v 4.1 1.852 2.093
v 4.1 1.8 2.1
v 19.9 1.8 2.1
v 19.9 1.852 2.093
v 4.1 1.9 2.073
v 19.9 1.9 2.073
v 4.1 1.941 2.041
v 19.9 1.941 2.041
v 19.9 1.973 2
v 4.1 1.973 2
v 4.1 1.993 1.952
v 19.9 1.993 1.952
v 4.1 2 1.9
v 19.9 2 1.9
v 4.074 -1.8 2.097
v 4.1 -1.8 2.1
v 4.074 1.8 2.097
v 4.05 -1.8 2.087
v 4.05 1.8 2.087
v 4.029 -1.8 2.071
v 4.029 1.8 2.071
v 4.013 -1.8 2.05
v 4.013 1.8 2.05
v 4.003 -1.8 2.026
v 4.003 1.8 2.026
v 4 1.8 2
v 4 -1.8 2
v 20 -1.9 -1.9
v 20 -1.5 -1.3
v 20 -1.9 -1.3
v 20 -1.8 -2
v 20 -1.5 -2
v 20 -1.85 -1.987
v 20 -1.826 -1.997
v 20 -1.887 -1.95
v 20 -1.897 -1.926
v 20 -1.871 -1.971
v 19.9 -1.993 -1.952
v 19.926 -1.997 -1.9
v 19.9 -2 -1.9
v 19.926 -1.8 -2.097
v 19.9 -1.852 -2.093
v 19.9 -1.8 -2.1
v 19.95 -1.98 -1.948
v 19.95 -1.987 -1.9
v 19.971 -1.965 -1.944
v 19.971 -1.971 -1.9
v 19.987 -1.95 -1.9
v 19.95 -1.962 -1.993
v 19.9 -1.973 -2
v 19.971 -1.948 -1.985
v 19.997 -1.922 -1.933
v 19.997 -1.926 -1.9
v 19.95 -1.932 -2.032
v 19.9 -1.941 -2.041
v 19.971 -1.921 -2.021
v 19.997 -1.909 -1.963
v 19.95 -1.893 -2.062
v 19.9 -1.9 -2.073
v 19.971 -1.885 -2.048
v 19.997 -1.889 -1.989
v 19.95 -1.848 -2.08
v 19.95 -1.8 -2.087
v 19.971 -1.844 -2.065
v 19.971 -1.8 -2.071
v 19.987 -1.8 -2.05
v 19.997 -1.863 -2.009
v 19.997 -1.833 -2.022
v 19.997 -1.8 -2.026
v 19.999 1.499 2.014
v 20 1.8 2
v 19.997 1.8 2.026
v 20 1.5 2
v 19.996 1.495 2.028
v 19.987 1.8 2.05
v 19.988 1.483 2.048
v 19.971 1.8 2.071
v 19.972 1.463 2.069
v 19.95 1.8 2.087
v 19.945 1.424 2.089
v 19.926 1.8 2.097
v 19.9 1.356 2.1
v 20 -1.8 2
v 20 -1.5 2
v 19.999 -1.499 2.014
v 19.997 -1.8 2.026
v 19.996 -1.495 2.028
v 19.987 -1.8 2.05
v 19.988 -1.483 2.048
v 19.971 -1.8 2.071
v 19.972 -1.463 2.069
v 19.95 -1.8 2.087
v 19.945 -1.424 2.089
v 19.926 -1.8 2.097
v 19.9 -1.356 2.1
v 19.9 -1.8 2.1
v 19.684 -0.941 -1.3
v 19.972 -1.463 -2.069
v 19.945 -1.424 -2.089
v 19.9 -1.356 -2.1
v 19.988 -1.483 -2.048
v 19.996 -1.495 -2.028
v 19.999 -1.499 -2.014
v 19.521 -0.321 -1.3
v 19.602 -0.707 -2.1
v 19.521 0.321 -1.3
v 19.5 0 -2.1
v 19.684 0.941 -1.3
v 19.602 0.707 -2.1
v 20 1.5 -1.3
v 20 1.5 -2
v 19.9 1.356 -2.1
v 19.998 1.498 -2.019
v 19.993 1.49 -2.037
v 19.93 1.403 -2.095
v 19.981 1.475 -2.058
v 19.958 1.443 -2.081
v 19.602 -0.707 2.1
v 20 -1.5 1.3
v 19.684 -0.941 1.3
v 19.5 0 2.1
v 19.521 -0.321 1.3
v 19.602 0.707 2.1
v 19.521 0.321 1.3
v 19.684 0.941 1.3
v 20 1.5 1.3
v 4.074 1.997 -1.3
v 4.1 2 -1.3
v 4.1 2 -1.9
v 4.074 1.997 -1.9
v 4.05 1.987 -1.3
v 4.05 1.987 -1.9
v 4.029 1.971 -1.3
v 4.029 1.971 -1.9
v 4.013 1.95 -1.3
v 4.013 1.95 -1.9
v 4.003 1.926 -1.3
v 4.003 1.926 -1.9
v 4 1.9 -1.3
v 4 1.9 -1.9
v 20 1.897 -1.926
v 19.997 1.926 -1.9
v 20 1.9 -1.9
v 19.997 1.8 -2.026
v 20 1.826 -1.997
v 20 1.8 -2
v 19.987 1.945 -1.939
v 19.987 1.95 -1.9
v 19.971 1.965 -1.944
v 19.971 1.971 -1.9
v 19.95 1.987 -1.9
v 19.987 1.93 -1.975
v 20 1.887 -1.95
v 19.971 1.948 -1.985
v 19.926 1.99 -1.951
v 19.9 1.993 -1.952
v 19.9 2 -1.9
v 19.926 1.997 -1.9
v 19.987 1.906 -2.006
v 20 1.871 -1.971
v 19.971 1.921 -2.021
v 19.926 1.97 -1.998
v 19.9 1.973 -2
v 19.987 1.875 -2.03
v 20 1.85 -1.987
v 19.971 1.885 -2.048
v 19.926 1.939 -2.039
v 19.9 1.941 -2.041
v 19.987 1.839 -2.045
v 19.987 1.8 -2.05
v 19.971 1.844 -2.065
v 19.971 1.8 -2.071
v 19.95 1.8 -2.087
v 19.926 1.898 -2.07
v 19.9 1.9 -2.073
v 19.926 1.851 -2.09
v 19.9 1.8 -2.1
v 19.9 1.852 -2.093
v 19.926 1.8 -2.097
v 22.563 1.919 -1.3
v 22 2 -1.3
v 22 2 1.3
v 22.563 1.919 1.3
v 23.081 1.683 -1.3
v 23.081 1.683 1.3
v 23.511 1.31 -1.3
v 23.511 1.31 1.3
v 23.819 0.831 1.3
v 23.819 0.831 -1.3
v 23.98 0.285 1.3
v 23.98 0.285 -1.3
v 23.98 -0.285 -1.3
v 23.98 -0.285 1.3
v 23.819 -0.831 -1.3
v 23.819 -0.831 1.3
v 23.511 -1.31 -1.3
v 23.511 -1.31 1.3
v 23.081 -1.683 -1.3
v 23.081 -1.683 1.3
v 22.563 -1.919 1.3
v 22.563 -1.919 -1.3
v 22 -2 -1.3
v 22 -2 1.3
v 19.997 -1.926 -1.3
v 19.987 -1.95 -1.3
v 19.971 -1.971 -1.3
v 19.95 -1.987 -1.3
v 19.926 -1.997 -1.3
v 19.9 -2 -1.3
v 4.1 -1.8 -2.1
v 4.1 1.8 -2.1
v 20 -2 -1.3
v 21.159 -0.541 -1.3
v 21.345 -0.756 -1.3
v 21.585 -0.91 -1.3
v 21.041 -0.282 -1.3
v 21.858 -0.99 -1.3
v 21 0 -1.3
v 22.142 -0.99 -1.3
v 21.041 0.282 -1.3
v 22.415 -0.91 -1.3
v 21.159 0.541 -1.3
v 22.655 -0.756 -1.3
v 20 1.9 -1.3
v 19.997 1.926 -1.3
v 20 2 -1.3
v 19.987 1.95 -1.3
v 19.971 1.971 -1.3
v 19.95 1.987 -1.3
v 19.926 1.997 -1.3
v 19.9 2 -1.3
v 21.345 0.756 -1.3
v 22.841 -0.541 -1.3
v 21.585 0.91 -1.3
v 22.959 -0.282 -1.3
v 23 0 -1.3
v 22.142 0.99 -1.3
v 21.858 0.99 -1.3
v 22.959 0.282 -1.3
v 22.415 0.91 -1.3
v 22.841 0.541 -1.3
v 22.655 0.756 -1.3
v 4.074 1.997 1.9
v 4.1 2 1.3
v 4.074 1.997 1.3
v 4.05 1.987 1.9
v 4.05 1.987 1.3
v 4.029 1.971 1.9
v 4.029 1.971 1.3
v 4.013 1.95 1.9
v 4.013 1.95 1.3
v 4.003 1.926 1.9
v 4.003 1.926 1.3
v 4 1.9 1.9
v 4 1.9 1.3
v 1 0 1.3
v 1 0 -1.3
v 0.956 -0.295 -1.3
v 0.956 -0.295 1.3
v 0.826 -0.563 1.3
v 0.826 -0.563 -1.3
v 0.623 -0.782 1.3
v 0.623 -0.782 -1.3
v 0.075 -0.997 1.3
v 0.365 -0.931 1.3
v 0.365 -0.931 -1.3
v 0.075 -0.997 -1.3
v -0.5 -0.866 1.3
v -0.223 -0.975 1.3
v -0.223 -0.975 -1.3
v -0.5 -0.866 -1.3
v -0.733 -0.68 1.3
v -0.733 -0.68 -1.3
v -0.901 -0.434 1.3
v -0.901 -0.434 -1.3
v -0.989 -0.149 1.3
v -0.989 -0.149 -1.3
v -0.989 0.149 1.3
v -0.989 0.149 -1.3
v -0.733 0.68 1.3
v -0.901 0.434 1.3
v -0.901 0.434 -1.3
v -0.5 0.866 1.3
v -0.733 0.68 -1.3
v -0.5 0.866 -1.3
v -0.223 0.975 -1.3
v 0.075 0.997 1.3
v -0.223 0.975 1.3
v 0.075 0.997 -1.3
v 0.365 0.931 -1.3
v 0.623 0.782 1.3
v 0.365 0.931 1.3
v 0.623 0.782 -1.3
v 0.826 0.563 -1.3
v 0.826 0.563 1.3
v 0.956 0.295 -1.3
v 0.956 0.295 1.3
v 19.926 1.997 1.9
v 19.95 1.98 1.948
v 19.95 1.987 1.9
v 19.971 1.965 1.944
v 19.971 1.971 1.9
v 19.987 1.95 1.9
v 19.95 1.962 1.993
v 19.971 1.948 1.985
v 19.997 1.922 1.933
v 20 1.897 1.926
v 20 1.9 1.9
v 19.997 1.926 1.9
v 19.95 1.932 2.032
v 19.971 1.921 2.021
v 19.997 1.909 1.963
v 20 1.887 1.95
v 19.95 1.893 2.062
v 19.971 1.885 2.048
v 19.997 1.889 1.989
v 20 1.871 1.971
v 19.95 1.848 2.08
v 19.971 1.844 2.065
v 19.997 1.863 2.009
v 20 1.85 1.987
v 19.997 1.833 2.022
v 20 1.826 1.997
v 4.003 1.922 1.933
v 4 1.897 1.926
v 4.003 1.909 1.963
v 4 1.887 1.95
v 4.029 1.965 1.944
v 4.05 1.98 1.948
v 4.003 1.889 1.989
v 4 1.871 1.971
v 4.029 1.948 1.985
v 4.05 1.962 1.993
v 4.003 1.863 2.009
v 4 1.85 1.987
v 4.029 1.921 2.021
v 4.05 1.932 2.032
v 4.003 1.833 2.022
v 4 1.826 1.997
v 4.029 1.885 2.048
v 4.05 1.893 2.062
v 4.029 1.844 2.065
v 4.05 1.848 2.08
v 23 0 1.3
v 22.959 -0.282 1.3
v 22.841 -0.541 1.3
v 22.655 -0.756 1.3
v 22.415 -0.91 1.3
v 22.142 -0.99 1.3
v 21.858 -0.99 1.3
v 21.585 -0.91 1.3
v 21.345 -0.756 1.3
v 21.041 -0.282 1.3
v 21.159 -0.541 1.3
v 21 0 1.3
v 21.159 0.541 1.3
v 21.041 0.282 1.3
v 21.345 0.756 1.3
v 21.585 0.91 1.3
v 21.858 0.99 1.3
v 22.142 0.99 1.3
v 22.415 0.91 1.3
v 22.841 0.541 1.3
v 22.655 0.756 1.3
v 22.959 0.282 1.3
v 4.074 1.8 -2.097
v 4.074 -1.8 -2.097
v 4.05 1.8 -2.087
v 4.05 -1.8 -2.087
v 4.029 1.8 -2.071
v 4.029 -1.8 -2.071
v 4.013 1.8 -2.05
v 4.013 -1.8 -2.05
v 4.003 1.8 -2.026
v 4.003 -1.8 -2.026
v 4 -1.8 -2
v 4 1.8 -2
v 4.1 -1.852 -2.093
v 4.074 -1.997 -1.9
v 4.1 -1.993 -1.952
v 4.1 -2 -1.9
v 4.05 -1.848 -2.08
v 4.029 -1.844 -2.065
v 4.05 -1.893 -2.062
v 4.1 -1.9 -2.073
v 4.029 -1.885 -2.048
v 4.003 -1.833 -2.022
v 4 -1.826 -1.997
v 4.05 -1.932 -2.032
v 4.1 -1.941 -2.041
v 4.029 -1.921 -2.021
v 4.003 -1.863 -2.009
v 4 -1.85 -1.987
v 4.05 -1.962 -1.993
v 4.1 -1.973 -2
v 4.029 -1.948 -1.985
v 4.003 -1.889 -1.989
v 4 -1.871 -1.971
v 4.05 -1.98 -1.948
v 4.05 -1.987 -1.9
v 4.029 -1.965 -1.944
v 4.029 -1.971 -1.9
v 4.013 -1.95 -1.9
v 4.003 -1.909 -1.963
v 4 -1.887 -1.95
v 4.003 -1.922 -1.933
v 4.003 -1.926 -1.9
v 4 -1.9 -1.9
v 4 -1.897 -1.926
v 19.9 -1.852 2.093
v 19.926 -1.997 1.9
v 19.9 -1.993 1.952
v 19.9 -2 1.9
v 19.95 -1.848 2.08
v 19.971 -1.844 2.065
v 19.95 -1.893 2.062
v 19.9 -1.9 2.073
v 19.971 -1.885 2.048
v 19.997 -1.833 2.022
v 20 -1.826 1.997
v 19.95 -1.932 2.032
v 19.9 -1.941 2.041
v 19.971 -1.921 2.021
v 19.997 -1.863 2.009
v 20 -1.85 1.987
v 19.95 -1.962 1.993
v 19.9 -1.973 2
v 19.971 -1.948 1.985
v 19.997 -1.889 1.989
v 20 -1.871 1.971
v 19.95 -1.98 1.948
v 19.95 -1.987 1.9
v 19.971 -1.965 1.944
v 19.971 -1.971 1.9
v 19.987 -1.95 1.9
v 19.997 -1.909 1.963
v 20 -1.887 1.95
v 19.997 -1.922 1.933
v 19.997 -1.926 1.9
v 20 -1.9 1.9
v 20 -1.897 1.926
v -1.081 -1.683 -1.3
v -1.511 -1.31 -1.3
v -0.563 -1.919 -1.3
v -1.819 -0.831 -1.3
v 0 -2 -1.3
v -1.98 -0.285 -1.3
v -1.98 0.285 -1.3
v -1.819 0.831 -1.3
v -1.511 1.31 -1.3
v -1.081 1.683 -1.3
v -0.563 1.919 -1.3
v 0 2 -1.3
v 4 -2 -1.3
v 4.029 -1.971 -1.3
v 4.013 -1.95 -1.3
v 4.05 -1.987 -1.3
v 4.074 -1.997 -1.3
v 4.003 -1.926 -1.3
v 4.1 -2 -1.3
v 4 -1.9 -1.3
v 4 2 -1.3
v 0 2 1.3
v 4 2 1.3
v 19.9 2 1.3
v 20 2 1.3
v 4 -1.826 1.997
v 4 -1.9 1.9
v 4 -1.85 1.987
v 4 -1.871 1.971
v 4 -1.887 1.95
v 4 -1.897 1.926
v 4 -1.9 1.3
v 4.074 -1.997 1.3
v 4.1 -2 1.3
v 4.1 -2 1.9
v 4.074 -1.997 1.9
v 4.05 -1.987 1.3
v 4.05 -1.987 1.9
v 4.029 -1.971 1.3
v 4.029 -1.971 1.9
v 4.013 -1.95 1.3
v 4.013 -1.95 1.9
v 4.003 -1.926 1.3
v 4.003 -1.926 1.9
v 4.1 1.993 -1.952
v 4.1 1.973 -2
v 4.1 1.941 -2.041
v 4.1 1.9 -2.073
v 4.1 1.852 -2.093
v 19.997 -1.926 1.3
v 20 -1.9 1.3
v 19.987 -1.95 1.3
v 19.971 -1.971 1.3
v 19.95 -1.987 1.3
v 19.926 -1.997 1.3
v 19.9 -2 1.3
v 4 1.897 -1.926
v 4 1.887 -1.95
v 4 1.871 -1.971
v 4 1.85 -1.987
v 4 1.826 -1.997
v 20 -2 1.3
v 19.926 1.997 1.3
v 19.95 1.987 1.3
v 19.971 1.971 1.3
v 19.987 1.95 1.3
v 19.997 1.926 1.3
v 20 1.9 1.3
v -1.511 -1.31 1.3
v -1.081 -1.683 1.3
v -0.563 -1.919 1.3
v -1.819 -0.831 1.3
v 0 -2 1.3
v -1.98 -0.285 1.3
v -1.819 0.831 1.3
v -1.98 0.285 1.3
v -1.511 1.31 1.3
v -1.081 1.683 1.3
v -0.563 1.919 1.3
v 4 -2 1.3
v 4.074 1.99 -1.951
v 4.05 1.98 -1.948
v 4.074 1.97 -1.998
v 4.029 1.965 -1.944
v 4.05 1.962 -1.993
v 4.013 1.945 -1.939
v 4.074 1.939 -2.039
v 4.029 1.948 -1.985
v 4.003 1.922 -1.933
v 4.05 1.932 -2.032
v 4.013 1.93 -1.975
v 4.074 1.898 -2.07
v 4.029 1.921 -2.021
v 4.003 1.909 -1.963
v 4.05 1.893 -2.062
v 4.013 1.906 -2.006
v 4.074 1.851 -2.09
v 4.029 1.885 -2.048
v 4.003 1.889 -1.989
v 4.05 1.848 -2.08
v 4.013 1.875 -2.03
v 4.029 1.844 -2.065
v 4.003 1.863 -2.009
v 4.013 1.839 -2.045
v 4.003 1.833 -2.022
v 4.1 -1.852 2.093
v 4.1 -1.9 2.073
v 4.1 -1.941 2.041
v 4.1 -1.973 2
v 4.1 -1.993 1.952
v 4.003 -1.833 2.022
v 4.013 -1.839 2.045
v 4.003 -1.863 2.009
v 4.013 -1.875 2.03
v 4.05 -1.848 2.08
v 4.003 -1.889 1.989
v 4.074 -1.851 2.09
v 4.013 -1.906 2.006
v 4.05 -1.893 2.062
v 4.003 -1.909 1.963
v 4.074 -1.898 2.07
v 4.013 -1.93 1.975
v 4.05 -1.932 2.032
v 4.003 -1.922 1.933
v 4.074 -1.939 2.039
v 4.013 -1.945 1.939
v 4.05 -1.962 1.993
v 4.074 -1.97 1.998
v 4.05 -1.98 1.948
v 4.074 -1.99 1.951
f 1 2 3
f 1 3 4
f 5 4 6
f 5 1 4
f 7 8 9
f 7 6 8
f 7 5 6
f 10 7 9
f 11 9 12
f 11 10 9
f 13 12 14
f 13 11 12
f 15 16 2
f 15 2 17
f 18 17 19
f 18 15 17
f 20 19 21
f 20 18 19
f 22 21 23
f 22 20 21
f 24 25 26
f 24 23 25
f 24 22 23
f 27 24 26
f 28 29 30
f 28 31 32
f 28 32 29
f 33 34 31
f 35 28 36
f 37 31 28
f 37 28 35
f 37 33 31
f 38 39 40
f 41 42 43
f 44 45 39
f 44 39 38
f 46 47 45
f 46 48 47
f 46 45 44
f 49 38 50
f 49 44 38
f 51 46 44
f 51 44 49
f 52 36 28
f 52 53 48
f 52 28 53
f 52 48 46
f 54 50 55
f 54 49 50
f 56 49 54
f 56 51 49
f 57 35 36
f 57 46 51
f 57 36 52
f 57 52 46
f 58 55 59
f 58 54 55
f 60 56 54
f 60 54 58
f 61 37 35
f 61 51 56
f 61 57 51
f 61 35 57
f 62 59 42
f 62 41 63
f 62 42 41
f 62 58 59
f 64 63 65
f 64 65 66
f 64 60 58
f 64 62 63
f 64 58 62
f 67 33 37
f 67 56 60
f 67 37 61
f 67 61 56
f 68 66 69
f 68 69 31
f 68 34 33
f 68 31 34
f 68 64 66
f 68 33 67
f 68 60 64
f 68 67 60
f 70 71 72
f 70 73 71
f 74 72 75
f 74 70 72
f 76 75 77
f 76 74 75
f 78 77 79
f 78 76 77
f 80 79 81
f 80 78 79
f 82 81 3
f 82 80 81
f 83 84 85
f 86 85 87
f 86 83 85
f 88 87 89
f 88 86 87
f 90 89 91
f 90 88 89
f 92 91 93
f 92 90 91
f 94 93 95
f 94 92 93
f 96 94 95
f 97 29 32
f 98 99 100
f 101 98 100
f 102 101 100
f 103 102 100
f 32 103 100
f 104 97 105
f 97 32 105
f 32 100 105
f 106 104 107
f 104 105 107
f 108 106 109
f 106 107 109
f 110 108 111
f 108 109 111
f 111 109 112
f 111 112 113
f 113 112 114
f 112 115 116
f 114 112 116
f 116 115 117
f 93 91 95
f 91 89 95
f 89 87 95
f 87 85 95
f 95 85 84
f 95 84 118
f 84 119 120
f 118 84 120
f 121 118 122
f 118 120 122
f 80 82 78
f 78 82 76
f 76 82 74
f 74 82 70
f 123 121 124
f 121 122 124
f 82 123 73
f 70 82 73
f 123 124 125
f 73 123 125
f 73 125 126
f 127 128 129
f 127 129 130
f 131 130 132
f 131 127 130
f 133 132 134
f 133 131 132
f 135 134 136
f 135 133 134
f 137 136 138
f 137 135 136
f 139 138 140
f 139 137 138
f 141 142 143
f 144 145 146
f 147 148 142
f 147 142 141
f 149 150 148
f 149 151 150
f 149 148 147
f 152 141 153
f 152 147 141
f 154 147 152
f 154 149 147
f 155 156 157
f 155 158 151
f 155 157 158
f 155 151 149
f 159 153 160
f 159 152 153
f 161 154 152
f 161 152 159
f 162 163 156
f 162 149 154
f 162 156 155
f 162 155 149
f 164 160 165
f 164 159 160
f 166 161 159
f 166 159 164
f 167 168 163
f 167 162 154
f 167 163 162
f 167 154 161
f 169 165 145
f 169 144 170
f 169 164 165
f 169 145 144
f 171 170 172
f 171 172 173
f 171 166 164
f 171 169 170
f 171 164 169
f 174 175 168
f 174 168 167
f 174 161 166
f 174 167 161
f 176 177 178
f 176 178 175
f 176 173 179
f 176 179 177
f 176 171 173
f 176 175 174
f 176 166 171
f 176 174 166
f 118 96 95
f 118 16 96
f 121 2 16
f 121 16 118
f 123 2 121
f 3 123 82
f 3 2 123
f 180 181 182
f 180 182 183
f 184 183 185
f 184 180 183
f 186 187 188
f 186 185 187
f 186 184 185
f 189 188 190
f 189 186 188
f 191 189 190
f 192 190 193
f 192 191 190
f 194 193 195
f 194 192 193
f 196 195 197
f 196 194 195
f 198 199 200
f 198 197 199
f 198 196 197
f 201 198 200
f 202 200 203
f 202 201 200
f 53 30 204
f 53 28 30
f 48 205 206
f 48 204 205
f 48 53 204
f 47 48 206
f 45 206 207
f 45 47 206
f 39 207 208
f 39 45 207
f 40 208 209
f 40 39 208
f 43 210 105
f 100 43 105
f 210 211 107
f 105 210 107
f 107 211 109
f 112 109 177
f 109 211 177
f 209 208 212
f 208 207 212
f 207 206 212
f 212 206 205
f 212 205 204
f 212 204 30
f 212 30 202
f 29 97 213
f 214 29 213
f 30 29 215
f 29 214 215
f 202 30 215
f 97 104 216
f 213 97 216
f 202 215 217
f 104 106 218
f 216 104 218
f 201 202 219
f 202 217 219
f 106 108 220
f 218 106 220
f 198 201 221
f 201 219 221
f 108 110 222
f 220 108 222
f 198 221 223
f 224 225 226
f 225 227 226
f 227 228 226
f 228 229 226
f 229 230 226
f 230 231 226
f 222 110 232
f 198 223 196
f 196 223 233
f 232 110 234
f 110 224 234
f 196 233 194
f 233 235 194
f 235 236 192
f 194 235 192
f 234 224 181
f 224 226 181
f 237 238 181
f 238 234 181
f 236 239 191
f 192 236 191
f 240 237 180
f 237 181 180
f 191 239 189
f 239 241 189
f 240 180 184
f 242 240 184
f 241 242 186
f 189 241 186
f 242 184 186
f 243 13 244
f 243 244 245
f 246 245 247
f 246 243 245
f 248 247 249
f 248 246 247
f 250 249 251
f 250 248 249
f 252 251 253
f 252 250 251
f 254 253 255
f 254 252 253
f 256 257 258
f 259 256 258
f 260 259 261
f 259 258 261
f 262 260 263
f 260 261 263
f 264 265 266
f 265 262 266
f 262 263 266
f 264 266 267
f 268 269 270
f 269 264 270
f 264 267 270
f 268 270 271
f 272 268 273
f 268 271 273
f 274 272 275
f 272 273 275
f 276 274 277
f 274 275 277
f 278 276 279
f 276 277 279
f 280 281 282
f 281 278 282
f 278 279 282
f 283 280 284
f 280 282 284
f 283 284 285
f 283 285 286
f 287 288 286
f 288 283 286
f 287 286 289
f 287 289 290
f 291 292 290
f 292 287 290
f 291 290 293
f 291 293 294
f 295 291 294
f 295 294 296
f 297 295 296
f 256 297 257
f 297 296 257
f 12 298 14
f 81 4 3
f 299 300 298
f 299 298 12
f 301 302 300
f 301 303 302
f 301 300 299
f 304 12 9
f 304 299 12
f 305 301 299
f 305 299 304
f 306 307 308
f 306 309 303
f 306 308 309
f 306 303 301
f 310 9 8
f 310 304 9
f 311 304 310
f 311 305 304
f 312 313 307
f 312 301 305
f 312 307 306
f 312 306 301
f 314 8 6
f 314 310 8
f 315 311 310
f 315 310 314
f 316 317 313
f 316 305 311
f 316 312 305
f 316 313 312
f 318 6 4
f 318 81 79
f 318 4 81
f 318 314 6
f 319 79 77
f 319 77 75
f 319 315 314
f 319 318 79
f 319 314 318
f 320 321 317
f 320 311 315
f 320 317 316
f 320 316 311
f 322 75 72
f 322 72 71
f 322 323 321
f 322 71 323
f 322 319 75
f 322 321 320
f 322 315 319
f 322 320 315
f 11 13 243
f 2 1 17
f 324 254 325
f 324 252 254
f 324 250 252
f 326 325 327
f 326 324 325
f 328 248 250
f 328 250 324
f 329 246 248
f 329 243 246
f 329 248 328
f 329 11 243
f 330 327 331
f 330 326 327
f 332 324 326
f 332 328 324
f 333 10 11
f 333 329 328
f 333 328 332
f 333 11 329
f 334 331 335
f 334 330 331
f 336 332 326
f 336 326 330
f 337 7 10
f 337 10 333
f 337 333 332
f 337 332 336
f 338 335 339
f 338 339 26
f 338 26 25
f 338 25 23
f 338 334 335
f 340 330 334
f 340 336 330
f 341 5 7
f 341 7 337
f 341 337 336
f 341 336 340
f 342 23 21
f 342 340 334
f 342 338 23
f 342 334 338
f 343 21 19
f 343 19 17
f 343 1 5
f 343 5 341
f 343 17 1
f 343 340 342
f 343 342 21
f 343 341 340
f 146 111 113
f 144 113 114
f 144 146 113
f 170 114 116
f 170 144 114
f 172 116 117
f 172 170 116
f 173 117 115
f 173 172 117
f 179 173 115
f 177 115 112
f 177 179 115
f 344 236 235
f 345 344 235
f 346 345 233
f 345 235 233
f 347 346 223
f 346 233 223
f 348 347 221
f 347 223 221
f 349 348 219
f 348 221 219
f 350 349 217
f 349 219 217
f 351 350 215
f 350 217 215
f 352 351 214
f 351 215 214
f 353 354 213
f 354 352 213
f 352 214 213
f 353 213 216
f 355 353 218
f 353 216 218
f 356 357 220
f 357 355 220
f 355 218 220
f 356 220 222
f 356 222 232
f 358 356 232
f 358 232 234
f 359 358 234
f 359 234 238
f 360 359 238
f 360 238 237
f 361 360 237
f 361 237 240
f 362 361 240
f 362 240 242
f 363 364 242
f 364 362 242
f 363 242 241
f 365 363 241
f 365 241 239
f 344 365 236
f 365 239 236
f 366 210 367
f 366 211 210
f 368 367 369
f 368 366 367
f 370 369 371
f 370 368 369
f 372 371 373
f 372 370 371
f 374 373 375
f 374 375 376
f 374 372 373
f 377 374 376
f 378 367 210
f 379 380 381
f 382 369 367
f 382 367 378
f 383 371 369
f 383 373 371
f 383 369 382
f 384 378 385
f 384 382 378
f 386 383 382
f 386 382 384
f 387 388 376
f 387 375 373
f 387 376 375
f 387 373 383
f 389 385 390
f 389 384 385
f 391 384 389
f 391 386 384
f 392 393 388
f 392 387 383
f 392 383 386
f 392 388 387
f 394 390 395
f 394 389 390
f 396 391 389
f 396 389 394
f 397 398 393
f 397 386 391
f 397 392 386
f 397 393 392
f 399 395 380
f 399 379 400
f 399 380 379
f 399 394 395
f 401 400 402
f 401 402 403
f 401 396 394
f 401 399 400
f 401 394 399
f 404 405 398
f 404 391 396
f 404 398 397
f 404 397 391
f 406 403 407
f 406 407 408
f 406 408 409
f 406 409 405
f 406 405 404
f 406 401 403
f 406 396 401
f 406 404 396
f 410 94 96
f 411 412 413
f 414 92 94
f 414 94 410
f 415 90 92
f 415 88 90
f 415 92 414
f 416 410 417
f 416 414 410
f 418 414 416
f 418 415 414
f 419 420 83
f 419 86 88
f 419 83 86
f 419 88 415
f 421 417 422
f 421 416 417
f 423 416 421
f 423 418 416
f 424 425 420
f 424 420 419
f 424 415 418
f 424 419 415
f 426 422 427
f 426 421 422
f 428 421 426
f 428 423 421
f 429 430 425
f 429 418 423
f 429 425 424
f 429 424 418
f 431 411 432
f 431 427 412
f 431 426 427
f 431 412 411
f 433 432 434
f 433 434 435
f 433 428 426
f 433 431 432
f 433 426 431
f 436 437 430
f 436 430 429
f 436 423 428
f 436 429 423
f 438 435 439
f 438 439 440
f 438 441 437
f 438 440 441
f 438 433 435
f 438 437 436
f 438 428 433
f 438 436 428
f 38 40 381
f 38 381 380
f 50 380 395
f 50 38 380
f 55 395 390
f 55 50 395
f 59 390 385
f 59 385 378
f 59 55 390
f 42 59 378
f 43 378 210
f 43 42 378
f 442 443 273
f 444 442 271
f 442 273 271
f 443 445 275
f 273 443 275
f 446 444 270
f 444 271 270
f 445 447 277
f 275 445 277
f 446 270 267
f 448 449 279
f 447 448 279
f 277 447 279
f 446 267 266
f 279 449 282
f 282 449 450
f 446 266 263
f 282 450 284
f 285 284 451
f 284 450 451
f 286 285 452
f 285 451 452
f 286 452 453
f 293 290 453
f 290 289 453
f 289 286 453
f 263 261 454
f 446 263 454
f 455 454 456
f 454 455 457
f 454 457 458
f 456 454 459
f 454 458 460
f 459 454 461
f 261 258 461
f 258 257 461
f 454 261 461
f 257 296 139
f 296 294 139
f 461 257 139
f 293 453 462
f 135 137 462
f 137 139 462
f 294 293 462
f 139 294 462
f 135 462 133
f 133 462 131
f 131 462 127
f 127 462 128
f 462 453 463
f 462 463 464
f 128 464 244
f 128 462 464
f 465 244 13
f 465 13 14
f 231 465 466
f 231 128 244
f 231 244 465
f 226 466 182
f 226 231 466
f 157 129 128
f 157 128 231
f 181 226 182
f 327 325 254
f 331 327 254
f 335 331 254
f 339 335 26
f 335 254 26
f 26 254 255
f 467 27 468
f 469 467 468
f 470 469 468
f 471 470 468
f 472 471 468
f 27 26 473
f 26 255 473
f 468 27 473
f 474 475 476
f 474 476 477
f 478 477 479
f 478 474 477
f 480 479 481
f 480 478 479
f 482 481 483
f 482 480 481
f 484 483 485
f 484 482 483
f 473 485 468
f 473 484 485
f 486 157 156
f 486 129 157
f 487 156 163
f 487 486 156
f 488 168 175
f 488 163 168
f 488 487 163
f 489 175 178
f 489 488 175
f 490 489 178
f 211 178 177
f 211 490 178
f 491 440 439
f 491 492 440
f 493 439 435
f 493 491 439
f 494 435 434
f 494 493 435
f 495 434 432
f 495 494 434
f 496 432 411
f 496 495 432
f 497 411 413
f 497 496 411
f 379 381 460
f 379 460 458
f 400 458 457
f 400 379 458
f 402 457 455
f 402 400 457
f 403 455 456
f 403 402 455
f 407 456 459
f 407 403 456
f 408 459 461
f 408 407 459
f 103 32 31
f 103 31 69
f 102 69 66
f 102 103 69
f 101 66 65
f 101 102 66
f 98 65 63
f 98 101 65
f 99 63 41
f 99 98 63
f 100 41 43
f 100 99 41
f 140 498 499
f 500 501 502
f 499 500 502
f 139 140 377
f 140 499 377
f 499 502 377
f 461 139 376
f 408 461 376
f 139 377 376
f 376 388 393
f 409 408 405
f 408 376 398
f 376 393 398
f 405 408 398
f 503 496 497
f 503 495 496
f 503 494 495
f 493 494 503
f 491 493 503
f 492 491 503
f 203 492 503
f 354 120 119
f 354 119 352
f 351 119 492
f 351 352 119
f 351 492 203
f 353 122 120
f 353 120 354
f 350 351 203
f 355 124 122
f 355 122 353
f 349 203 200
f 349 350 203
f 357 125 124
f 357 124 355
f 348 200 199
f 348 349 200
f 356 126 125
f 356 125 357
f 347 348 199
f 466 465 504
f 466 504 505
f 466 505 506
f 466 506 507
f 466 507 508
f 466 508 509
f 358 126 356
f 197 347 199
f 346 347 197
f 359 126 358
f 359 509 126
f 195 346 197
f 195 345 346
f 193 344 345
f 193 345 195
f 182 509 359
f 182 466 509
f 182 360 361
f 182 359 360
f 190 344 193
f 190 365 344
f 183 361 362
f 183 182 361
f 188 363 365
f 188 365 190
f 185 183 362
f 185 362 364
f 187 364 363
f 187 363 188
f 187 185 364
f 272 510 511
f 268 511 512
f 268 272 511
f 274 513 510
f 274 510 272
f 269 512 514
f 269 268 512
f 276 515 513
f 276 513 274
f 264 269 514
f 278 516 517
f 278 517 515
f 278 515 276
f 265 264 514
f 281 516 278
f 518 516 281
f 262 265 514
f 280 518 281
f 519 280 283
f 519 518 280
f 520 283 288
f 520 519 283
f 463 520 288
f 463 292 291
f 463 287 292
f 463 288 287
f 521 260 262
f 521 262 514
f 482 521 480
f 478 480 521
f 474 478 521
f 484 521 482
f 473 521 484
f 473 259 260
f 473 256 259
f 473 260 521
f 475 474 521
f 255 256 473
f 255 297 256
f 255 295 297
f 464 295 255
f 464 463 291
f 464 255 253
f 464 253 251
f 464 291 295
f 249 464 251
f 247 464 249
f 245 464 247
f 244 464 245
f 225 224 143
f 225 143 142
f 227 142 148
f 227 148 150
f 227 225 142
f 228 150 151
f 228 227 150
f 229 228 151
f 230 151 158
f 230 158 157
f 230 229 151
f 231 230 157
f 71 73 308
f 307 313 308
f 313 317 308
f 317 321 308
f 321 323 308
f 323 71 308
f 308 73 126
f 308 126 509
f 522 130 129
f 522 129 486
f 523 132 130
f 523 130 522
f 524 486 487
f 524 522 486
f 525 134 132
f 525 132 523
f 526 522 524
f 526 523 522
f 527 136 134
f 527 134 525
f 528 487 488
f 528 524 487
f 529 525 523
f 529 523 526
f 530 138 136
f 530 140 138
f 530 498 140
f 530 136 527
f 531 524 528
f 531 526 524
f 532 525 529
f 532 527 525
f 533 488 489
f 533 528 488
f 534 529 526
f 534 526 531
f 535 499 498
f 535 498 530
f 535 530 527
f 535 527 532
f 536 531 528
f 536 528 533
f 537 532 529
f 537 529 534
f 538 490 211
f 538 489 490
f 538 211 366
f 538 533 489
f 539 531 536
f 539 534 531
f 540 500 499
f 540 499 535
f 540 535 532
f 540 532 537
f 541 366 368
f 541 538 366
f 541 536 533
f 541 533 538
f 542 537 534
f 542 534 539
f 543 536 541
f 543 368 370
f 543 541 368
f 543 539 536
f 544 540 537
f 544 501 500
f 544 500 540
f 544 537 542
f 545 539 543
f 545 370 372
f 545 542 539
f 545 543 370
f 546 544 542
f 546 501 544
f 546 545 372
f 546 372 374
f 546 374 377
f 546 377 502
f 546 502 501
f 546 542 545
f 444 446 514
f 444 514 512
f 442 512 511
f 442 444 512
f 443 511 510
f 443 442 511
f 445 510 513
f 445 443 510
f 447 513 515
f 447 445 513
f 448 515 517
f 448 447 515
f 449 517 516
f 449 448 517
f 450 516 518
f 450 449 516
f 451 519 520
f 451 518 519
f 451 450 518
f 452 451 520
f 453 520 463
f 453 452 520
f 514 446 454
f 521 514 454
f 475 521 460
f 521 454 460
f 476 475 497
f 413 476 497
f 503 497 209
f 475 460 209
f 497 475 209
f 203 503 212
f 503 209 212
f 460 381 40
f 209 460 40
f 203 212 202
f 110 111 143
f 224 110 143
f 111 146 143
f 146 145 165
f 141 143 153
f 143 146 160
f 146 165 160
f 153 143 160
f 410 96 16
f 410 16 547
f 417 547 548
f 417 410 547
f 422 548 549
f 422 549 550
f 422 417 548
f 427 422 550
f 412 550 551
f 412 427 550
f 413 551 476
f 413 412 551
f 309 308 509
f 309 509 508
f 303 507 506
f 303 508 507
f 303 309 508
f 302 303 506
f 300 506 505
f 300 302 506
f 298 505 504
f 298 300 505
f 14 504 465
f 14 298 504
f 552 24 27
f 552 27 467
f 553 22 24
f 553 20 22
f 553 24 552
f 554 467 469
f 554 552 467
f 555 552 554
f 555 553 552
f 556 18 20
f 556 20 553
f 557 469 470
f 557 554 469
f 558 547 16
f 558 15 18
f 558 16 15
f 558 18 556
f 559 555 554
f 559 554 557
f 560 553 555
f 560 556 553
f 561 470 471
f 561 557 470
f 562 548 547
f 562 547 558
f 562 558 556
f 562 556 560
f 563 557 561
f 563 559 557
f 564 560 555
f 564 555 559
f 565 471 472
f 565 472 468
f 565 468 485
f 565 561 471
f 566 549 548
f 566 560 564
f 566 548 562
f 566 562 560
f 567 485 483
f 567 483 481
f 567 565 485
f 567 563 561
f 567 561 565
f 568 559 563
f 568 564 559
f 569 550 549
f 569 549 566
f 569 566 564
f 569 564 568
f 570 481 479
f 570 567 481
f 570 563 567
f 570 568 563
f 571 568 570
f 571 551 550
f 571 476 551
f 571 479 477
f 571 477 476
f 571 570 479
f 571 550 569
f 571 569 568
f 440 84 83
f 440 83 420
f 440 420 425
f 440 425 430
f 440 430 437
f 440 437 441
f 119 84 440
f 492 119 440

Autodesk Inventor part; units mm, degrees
ref_plane "YZ Plane" through (0, 0, 0) normal (1, 0, 0) x (0, 1, 0)
ref_plane "XZ Plane" through (0, 0, 0) normal (0, 1, 0) x (-1, 0, 0)
ref_plane "XY Plane" through (0, 0, 0) normal (0, 0, 1) x (1, 0, 0)
sketch "Sketch1" plane through (0, 0, 0) normal (0, 0, 1) x (1, 0, 0)
  circle A0 centre (0, 0) radius 2
  circle A1 centre (0, 0) radius 1
  line L0 (0, 0) -> (22, 0)
  circle A2 centre (22, 0) radius 1
  circle A3 centre (22, 0) radius 2
  line L1 (0, 2) -> (22, 2)
  line L2 (0, -2) -> (22, -2)
  dimension "d0" = 4
  dimension "d1" = 2
  dimension "d2" = 22
  dimension "d3" = 2
  dimension "d4" = 4
extrude "Extrusion1" add sketch "Sketch1" along normal mid plane 2.6
sketch "Sketch3" plane through (0, 0, 0) normal (0, 0, 1) x (1, 0, 0)
  line L0 (0, 0) -> (4, 0)
  line L1 (4, 0) -> (4, 2)
  line L2 (22, 2) -> (0, 2) projected
  line L3 (4, 0) -> (4, -2)
  line L4 (0, -2) -> (22, -2) projected
  line L5 (4, 0) -> (20, 0)
  line L6 (20, 0) -> (20, 2)
  line L7 (20, 0) -> (20, -2)
  circle A0 centre (22, 0) radius 2.5
  point P0 (20, 1.5)
  point P1 (20, -1.5)
  dimension "d16" = 4
  dimension "d17" = 5
extrude "Extrusion3" add sketch "Sketch3" along normal mid plane 4.2 contours L5 A0 L7 L4 L3 | L1 L2 L6 A0 L5
fillet "Fillet3" radius 0.2 4 edges at (12, 2, 2.1) (12, -2, 2.1) (12, -2, -2.1) (12, 2, -2.1)
fillet "Fillet4" radius 0.1 20 edges at (20, 1.9414, 2.0414) (20, 2, 1.6) (20, 1.65, 2.1) (20, -1.65, 2.1) (20, -2, 1.6) (20, -1.9414, 2.0414) (20, 1.65, -2.1) (20, 2, -1.6) (20, 1.9414, -2.0414) (20, -1.9414, -2.0414) (20, -2, -1.6) (20, -1.65, -2.1) (4, 2, -1.6) (4, 0, -2.1) (4, -2, 1.6) (4, -2, -1.6) (4, 1.9414, -2.0414) (4, 1.9414, 2.0414) (4, 0, 2.1) (4, 2, 1.6)
properties part number "New_ThinArm_first"
